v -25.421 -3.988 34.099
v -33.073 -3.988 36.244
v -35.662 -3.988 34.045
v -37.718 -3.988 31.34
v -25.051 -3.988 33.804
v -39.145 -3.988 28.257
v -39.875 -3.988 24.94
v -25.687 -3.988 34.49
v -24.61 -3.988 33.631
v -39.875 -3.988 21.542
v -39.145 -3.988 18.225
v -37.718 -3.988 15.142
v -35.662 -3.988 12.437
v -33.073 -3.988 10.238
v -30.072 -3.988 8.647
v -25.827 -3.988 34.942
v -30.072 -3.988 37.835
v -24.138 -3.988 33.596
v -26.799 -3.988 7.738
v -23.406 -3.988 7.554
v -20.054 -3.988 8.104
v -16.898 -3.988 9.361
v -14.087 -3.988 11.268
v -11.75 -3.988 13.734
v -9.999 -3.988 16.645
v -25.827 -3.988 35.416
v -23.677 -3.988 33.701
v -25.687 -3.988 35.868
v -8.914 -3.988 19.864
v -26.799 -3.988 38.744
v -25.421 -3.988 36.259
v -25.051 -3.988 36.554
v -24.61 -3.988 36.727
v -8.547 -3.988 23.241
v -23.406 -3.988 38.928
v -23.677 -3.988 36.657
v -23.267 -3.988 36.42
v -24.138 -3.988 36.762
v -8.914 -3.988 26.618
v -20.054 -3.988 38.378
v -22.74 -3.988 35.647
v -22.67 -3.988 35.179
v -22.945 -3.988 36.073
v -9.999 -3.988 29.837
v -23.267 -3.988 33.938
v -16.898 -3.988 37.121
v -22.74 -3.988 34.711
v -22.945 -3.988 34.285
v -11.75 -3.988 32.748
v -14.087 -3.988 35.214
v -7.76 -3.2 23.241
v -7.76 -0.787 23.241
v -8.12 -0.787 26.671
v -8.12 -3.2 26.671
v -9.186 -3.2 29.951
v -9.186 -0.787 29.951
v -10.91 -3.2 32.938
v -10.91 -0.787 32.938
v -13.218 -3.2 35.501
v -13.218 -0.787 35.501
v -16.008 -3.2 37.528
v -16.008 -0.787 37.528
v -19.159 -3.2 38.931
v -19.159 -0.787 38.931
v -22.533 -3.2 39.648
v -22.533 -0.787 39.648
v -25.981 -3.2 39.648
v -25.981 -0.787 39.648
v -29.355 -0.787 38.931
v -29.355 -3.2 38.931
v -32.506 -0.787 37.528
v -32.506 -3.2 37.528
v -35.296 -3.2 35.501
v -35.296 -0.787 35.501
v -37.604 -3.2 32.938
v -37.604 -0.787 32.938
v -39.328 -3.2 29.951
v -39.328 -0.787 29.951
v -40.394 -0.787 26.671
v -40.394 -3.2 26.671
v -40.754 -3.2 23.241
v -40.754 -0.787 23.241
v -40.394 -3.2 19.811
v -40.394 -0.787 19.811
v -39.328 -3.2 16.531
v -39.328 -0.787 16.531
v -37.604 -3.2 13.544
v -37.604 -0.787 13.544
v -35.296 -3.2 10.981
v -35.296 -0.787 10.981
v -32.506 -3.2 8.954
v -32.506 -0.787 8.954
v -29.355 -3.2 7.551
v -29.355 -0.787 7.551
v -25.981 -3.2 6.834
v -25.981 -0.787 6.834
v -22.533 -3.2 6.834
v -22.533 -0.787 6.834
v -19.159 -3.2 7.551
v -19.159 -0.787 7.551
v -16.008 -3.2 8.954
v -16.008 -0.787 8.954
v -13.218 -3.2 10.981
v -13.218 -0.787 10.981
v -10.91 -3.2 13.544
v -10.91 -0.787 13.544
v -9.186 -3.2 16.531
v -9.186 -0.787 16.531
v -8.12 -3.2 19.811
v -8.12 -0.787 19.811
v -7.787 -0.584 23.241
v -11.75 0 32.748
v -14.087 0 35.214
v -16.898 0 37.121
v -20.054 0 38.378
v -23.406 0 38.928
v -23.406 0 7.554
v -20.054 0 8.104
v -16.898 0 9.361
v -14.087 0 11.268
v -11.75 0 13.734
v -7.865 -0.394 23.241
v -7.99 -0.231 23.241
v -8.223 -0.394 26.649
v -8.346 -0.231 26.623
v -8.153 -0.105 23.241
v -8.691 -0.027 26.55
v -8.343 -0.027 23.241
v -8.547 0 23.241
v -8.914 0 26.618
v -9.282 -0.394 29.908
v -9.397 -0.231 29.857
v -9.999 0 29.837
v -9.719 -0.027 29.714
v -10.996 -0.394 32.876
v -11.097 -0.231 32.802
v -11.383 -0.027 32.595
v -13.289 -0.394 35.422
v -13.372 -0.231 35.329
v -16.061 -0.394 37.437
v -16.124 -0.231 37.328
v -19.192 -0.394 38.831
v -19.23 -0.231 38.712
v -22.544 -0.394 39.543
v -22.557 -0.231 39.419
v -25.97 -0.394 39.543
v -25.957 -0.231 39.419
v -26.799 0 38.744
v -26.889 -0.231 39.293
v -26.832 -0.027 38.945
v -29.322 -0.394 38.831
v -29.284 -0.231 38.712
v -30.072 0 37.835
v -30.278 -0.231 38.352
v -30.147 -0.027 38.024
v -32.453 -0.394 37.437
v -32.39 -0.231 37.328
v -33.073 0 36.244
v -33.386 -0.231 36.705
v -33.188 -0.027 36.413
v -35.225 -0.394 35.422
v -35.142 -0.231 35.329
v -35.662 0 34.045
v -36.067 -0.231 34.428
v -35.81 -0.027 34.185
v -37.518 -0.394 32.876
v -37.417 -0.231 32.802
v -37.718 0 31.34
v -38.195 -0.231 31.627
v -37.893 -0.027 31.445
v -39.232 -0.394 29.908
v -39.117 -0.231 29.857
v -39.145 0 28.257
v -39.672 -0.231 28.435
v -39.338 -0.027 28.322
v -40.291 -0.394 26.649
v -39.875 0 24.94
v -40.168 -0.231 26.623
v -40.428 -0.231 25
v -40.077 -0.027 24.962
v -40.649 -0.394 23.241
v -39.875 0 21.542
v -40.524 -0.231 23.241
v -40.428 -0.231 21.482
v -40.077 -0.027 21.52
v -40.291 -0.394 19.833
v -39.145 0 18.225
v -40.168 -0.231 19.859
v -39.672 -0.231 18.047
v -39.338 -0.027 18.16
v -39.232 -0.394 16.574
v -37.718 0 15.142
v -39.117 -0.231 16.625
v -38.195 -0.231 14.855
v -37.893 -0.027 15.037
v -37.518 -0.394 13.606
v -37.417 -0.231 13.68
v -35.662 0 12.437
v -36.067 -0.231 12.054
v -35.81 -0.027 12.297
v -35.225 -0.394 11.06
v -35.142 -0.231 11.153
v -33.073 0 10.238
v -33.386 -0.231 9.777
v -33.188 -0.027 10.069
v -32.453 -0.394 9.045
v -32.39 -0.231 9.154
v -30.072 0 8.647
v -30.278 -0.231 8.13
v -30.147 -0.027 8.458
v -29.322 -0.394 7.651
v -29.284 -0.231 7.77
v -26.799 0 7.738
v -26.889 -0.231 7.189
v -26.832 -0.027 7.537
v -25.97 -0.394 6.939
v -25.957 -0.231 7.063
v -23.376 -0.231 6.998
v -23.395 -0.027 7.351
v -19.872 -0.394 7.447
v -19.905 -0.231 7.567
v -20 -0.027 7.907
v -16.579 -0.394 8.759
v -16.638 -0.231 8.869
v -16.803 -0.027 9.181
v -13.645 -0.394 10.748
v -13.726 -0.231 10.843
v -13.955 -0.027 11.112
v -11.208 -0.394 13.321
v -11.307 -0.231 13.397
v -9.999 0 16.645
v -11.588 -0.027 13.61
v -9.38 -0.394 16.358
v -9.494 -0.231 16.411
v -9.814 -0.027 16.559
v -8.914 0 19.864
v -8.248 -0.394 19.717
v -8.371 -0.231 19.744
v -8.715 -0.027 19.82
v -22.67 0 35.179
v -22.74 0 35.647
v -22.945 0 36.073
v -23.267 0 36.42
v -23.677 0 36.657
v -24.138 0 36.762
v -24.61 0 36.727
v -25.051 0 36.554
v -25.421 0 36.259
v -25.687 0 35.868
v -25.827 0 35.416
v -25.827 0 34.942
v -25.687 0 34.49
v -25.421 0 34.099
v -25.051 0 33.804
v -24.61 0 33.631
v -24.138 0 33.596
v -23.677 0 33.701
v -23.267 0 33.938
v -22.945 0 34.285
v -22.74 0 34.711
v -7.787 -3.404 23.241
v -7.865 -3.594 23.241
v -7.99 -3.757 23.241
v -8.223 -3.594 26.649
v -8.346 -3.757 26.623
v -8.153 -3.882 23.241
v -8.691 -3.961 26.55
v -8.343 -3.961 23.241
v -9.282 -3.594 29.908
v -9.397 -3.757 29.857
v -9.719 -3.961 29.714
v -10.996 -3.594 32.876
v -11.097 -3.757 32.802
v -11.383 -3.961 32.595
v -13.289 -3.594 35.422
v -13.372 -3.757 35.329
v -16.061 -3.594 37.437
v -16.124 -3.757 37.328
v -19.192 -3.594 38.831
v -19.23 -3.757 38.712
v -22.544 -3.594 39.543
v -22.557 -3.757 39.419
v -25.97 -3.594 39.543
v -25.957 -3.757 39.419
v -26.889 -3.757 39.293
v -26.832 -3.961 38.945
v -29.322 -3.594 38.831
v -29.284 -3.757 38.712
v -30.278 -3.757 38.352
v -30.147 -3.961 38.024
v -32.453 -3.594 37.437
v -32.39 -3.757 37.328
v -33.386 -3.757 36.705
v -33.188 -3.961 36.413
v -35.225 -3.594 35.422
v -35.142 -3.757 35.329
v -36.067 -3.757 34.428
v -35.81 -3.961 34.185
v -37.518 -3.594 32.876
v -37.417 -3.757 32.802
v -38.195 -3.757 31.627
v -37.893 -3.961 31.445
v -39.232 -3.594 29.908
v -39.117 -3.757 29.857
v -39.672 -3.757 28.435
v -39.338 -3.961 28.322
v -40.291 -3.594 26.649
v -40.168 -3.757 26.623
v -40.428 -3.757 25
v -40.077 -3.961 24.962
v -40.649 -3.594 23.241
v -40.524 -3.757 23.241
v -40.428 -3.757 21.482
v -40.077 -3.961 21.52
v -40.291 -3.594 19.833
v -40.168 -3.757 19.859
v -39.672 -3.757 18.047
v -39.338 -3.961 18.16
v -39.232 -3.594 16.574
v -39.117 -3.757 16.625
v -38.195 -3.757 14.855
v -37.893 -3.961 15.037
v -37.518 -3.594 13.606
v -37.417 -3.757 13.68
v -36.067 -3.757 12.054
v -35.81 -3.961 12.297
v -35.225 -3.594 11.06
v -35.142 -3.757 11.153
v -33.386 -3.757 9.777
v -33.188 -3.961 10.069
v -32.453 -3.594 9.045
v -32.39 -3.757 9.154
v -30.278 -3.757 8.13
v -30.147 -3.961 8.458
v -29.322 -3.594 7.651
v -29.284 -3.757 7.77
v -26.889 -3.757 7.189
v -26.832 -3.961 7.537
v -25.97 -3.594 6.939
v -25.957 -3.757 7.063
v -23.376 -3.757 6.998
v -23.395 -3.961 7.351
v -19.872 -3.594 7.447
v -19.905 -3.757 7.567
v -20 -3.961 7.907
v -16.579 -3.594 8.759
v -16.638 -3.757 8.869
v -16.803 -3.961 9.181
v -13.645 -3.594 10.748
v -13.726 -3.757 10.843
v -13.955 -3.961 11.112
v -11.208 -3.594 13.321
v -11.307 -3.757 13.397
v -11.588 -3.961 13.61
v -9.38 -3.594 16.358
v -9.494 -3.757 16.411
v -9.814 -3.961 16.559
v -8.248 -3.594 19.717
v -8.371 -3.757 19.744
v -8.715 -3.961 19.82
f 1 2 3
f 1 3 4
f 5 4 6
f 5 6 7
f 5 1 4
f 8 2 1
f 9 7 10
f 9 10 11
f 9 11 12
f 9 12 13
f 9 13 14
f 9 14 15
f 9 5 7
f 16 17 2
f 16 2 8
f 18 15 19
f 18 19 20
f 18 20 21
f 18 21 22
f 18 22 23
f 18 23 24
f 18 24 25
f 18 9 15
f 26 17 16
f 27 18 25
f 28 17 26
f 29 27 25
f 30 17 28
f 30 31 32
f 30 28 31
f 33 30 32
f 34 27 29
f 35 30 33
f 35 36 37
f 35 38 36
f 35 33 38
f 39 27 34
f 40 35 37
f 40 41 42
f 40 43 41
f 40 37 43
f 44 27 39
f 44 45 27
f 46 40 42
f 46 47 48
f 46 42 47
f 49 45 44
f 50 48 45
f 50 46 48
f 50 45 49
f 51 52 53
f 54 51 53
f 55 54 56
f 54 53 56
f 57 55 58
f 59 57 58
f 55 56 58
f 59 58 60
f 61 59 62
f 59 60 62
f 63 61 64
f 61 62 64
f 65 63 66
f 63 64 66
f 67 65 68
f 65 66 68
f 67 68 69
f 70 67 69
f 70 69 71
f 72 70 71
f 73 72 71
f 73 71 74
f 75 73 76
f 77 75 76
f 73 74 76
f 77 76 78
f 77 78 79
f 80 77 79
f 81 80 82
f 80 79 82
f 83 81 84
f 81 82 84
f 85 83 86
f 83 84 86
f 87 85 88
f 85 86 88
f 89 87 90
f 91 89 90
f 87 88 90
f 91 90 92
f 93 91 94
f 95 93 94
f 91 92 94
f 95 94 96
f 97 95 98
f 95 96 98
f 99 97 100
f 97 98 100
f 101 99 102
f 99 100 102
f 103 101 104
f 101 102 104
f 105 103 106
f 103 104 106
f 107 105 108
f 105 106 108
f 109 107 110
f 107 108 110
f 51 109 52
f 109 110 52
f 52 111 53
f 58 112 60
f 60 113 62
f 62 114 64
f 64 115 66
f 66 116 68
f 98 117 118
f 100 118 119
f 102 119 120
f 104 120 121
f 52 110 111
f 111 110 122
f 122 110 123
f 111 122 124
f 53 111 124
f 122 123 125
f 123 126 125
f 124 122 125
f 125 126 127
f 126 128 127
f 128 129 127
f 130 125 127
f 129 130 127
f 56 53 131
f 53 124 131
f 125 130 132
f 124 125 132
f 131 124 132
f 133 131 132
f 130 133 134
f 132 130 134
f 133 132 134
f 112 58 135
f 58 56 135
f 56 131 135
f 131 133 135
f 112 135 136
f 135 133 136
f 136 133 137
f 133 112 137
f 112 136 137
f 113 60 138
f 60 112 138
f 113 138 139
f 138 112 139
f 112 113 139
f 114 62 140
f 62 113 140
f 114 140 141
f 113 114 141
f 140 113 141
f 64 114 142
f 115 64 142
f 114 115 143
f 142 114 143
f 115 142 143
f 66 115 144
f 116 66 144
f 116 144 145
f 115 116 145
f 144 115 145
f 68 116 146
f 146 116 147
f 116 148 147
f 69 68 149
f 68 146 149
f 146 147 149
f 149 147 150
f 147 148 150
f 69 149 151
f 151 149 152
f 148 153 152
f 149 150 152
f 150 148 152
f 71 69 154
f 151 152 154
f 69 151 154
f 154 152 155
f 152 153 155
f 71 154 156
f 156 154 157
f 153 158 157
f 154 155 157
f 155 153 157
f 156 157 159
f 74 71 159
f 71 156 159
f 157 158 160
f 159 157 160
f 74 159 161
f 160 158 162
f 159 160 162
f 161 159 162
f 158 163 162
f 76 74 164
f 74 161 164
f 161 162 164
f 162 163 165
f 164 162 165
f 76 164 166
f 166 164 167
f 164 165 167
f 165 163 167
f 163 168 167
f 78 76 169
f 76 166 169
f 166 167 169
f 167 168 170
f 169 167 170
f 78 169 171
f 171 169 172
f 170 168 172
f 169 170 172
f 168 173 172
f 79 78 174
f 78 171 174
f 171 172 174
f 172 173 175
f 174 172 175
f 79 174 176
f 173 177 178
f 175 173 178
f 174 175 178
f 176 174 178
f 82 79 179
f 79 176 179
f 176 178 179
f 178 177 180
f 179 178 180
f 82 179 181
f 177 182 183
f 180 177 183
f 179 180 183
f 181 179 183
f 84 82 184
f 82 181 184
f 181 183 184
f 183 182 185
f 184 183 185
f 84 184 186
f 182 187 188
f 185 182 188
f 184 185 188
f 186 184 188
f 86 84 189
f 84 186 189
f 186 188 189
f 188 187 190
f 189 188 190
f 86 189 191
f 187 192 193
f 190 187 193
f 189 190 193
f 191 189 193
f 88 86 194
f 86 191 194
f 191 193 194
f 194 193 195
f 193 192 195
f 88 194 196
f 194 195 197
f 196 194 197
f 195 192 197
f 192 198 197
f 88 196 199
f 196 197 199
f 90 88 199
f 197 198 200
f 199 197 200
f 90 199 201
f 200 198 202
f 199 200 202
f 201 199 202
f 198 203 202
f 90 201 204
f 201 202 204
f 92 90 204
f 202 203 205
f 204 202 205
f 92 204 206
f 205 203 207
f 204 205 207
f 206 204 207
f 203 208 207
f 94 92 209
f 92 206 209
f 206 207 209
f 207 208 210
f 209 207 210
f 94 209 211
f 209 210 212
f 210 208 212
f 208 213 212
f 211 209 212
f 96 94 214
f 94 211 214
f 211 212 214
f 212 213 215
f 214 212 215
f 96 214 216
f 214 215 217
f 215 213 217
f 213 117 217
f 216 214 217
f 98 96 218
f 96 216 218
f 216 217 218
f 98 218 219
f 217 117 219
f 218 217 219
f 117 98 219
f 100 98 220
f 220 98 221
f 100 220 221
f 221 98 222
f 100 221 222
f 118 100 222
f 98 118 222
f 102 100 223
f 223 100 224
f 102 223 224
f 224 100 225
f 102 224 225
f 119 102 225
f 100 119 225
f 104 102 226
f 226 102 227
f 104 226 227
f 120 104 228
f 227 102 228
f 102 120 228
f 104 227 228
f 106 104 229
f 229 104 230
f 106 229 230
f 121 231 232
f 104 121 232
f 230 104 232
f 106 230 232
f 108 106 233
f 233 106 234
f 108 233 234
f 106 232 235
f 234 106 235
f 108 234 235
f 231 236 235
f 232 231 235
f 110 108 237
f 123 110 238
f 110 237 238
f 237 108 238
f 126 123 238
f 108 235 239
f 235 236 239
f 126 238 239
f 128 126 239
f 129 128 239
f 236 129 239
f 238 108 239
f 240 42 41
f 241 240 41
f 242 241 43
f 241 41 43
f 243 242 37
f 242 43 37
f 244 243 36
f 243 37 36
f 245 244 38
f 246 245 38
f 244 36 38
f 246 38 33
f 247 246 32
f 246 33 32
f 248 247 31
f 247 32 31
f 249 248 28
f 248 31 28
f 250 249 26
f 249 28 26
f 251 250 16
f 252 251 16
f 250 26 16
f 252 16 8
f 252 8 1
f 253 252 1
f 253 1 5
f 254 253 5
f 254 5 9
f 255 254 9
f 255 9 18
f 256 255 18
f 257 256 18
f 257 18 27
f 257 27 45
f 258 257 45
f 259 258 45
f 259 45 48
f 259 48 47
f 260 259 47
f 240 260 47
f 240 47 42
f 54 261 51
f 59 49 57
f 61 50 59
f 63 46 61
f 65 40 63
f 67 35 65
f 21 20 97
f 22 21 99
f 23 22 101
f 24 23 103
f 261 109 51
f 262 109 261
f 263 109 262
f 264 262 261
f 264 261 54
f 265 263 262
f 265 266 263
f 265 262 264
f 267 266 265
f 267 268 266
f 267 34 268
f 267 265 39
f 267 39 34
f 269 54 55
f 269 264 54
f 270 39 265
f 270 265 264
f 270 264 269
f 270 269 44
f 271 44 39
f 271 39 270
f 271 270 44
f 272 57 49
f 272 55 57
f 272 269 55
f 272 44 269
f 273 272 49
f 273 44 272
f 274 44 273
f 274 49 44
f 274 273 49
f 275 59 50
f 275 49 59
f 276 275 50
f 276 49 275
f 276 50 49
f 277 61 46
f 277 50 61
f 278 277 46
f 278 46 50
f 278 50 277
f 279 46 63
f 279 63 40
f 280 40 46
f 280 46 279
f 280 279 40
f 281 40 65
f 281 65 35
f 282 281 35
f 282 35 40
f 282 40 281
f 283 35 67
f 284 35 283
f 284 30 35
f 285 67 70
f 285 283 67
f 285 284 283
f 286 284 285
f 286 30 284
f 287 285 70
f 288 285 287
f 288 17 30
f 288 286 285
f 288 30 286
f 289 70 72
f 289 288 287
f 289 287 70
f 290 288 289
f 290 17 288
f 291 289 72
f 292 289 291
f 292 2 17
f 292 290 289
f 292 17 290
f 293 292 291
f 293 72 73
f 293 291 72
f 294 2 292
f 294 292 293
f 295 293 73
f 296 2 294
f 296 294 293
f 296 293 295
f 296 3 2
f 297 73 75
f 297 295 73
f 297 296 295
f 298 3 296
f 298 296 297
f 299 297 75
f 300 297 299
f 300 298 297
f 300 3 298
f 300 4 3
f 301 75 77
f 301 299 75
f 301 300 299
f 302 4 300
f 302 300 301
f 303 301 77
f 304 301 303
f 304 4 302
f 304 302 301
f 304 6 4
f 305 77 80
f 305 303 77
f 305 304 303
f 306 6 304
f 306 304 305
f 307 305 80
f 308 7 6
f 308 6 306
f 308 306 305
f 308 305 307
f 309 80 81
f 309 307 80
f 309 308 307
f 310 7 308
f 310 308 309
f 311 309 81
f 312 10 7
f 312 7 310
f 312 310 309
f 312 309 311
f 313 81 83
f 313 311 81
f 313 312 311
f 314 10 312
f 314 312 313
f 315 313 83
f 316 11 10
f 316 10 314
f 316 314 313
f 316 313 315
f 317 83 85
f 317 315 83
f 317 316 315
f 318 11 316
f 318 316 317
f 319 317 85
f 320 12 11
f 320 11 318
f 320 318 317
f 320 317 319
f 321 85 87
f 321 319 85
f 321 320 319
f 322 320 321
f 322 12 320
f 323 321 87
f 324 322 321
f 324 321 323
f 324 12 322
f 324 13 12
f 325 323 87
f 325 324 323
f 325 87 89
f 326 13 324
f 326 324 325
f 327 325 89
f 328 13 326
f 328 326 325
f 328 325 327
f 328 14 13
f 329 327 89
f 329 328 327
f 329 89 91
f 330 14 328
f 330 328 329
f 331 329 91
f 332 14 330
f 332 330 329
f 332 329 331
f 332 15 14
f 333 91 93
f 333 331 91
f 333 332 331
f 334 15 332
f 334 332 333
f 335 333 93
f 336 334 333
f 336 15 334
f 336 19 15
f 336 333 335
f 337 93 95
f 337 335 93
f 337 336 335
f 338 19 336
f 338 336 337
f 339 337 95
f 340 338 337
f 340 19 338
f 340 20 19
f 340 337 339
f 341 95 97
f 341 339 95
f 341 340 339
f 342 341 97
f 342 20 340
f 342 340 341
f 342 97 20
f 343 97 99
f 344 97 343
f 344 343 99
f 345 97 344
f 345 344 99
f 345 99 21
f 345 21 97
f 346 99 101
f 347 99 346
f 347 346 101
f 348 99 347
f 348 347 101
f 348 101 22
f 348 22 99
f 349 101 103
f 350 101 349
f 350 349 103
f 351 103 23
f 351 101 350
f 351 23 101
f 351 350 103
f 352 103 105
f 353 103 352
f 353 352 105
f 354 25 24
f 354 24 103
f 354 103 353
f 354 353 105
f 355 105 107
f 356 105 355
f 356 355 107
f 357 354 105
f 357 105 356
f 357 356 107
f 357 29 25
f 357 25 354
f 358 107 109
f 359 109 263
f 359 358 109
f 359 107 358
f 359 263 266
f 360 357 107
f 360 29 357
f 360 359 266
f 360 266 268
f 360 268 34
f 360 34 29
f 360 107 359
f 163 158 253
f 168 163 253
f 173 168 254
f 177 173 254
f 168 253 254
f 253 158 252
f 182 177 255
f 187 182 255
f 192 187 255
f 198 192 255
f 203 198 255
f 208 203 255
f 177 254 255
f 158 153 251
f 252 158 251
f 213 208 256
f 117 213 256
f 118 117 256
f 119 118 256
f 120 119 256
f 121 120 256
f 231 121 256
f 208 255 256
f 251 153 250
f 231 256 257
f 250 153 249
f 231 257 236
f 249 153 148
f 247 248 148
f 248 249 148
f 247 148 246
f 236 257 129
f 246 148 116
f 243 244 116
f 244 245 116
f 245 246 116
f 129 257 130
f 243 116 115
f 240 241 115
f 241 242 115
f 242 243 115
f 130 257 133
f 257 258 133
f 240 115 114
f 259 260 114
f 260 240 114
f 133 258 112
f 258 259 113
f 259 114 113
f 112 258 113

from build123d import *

# Parameters (mm, degrees)
F0_R     = 16.4973
F1_DEPTH = 3.9878
F2_R     = 0.7874
F3_R     = 1.5875
F4_DEPTH = 25.4


with BuildPart() as f1:
    # F0 (on Front) → F1 (new body)
    with BuildSketch(Plane.XZ):
        with Locations((-24.256999, 23.241002)):
            Circle(F0_R)
    extrude(amount=F1_DEPTH)

    # F2
    f2_edges = [f1.edges().sort_by_distance(p)[0] for p in [
        (-40.754299, 0, 23.241002),
        (-40.754299, -3.9878, 23.241002),
    ]]
    fillet(f2_edges, radius=F2_R)

    # F3 (on face) → F4 (cut)
    with BuildSketch(Plane.XZ.offset(3.9878)):
        with Locations((-24.257001, 35.179)):
            Circle(F3_R)
    extrude(amount=-F4_DEPTH, mode=Mode.SUBTRACT)


solid = f1.part
